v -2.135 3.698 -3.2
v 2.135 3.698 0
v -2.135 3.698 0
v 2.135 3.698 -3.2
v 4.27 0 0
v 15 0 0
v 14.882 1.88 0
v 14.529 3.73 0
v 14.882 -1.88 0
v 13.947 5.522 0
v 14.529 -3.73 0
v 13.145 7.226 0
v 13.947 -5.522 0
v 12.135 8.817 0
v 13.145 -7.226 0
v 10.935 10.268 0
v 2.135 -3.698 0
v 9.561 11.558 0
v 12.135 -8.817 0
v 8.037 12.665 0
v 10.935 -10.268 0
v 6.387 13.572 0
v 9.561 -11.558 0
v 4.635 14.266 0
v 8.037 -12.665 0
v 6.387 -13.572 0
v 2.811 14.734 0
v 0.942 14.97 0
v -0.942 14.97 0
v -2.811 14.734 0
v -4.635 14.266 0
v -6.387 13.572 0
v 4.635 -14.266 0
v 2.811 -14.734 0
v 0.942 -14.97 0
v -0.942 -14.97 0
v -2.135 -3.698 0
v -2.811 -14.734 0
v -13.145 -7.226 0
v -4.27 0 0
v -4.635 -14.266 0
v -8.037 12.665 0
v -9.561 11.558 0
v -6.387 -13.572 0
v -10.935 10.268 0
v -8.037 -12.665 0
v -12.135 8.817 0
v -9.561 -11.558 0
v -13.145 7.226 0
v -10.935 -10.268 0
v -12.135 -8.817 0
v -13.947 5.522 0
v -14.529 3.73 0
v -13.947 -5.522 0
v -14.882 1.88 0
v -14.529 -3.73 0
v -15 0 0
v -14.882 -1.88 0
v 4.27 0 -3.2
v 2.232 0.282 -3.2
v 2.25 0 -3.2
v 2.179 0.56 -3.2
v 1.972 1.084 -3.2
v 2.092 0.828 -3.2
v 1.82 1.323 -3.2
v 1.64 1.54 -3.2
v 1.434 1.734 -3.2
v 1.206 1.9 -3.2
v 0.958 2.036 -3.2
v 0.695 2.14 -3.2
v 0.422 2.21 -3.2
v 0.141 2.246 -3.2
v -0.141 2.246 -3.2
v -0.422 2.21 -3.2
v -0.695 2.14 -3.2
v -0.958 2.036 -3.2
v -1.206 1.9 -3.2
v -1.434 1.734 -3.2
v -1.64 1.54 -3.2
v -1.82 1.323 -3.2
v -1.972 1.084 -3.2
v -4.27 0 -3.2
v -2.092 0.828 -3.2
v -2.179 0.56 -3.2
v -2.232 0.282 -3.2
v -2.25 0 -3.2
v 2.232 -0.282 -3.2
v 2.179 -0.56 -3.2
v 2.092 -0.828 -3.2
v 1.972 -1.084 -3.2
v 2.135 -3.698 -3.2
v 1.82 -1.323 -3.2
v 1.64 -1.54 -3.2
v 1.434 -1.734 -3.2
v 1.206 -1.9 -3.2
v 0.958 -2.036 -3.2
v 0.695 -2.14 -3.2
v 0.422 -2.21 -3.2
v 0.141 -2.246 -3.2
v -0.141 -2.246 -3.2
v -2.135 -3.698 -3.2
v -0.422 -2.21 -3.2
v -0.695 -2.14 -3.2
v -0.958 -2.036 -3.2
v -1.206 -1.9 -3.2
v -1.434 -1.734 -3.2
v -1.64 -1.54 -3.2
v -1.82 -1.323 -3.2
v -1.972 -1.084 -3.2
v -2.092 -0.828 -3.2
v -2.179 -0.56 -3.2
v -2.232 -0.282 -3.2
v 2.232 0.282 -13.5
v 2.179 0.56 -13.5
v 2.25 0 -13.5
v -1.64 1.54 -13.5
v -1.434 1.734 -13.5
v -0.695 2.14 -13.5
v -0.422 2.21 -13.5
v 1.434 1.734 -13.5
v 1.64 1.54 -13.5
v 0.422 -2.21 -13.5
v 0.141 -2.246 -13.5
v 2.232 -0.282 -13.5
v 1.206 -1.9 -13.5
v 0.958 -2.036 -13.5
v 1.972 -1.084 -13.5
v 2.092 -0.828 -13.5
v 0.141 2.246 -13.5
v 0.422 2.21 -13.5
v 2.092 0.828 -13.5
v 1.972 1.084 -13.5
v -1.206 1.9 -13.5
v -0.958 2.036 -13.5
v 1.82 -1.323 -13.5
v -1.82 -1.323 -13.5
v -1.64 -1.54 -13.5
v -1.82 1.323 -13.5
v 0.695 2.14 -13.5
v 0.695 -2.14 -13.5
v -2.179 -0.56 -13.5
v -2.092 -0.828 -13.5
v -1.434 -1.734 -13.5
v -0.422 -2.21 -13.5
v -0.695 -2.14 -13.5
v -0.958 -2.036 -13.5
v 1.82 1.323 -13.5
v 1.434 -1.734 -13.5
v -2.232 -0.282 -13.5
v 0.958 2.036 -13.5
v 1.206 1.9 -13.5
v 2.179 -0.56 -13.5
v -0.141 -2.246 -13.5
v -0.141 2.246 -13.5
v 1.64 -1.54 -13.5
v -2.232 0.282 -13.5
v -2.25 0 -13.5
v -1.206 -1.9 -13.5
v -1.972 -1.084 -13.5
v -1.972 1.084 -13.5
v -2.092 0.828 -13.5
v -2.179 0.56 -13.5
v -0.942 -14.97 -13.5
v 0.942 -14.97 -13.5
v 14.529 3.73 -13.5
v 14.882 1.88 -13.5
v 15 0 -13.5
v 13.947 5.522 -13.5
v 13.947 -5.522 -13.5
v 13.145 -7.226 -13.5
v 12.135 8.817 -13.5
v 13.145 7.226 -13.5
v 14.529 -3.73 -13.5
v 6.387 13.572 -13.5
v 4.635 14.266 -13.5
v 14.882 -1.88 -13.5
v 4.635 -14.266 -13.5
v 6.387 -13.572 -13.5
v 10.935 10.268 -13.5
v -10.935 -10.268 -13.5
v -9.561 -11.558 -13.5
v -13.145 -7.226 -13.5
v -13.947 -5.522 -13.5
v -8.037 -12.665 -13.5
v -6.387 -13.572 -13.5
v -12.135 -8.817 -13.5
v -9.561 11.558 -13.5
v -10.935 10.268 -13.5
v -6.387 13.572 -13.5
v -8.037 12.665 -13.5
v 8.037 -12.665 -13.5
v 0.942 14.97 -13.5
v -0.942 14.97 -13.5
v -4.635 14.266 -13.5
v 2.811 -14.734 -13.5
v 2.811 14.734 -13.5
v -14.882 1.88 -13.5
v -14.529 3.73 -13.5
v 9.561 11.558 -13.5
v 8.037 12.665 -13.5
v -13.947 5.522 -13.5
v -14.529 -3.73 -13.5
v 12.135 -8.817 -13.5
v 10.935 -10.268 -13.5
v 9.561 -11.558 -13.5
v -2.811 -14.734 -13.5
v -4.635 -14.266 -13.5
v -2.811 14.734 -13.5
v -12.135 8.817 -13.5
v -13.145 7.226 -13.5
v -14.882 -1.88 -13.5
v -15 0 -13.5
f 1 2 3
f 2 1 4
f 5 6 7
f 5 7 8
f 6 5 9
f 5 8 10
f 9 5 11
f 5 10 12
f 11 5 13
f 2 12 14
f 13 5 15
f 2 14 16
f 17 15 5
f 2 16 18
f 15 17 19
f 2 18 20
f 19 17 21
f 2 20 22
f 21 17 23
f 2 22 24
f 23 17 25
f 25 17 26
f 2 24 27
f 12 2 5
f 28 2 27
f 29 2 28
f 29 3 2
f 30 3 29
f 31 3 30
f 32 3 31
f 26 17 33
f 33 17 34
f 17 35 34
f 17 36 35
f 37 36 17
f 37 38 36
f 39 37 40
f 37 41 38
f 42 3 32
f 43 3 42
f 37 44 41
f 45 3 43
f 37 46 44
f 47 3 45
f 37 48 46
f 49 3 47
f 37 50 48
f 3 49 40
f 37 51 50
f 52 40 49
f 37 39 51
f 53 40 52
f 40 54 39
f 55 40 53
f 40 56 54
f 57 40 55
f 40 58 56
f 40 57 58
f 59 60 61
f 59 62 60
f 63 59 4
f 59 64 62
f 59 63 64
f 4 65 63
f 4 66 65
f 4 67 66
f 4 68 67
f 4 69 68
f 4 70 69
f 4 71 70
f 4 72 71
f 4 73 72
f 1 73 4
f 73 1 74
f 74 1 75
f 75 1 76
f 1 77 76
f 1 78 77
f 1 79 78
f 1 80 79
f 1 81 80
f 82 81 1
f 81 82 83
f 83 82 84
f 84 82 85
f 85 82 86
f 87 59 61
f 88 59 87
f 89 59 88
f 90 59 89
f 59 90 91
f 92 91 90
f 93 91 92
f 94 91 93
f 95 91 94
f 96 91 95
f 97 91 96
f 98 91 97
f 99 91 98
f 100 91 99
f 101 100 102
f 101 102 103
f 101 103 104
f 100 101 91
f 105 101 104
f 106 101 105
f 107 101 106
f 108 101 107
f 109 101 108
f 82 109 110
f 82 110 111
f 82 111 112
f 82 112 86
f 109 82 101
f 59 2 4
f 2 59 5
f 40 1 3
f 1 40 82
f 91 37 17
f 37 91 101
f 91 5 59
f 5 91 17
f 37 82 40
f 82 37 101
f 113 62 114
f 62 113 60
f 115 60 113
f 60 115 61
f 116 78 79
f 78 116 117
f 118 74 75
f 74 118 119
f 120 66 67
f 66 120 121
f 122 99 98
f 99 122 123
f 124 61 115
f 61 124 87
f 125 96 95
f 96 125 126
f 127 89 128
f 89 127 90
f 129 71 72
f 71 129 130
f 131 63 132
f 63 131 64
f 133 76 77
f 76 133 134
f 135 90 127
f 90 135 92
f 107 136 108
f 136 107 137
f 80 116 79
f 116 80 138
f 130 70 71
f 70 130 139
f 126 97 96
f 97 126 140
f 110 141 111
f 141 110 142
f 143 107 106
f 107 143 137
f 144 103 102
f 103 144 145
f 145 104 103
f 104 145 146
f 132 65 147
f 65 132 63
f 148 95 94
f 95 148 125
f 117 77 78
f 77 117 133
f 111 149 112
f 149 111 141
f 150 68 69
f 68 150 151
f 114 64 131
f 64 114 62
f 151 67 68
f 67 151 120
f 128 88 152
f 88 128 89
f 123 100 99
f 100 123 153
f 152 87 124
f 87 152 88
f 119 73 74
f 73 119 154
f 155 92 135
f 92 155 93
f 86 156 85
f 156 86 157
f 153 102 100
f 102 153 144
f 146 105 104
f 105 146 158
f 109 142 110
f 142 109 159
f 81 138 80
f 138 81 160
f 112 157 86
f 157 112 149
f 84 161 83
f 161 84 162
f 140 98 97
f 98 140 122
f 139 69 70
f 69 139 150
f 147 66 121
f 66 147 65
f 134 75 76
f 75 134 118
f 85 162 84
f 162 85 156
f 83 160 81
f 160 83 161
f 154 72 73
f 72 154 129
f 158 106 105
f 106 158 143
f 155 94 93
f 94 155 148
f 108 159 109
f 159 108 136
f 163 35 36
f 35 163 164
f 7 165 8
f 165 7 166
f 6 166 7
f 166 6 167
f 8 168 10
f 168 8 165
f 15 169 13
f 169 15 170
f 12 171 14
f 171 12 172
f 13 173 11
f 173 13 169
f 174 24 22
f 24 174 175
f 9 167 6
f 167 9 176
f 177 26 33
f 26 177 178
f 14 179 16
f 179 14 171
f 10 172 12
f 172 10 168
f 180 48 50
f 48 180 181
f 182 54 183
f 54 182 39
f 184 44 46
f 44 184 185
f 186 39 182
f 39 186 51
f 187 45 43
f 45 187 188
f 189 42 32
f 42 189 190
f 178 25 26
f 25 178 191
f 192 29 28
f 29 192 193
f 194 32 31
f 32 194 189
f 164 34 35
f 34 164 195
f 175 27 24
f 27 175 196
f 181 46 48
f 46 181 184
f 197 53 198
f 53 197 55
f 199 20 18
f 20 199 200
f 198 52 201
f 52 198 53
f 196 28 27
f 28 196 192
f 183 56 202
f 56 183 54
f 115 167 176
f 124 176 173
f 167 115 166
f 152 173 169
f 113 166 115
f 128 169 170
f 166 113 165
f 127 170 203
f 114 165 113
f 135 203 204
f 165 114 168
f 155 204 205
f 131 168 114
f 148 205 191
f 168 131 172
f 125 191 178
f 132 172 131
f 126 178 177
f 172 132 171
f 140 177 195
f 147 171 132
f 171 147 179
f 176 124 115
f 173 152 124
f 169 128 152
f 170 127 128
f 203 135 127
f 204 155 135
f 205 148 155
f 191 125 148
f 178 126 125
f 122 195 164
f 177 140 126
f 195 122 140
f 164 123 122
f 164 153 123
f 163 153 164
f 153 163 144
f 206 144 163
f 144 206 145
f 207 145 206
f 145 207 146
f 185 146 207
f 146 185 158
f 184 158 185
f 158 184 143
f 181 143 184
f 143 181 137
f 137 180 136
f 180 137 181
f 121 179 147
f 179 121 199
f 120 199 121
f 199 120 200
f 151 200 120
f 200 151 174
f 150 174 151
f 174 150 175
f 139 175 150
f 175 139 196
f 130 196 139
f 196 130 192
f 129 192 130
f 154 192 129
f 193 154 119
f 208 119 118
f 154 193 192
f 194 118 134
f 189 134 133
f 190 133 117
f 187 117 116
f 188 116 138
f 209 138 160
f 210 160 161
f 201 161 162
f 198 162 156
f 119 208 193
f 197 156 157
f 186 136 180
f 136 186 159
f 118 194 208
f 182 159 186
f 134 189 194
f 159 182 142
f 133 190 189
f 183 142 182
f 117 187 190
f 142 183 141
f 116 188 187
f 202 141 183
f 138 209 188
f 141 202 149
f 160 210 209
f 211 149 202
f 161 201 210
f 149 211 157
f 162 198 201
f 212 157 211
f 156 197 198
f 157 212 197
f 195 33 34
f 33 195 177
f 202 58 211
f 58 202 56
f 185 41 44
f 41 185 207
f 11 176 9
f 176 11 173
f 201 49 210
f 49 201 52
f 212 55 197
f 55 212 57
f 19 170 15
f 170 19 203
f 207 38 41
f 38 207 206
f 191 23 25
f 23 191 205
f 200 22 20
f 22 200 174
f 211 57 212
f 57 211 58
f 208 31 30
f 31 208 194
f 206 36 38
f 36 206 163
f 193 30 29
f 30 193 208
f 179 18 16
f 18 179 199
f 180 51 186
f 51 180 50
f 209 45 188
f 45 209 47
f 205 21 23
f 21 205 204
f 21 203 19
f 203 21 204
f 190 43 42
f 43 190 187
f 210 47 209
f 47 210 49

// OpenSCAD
$fn = 50;

difference() {
	union() {
		translate(v = [0, 0, -13.5]) {
			cylinder(h = 13.5, r = 15.0);
		}
	}
	union() {
		translate(v = [0, 0, 0]) {
			rotate(a = [0, 0, 0]) {
				difference() {
					union() {
						translate(v = [0, 0, -3.2]) {
							linear_extrude(height = 3.2) {
								polygon(points = [[4.2698, 0.0], [2.1349000000000005, 3.697755269078796], [-2.134899999999999, 3.6977552690787965], [-4.2698, 5.228996902999369e-16], [-2.134900000000002, -3.6977552690787956], [2.1348999999999974, -3.697755269078798]]);
							}
						}
					}
					union();
				}
			}
		}
		#translate(v = [0, 0, -100.0]) {
			cylinder(h = 200, r = 2.25);
		}
	}
}
